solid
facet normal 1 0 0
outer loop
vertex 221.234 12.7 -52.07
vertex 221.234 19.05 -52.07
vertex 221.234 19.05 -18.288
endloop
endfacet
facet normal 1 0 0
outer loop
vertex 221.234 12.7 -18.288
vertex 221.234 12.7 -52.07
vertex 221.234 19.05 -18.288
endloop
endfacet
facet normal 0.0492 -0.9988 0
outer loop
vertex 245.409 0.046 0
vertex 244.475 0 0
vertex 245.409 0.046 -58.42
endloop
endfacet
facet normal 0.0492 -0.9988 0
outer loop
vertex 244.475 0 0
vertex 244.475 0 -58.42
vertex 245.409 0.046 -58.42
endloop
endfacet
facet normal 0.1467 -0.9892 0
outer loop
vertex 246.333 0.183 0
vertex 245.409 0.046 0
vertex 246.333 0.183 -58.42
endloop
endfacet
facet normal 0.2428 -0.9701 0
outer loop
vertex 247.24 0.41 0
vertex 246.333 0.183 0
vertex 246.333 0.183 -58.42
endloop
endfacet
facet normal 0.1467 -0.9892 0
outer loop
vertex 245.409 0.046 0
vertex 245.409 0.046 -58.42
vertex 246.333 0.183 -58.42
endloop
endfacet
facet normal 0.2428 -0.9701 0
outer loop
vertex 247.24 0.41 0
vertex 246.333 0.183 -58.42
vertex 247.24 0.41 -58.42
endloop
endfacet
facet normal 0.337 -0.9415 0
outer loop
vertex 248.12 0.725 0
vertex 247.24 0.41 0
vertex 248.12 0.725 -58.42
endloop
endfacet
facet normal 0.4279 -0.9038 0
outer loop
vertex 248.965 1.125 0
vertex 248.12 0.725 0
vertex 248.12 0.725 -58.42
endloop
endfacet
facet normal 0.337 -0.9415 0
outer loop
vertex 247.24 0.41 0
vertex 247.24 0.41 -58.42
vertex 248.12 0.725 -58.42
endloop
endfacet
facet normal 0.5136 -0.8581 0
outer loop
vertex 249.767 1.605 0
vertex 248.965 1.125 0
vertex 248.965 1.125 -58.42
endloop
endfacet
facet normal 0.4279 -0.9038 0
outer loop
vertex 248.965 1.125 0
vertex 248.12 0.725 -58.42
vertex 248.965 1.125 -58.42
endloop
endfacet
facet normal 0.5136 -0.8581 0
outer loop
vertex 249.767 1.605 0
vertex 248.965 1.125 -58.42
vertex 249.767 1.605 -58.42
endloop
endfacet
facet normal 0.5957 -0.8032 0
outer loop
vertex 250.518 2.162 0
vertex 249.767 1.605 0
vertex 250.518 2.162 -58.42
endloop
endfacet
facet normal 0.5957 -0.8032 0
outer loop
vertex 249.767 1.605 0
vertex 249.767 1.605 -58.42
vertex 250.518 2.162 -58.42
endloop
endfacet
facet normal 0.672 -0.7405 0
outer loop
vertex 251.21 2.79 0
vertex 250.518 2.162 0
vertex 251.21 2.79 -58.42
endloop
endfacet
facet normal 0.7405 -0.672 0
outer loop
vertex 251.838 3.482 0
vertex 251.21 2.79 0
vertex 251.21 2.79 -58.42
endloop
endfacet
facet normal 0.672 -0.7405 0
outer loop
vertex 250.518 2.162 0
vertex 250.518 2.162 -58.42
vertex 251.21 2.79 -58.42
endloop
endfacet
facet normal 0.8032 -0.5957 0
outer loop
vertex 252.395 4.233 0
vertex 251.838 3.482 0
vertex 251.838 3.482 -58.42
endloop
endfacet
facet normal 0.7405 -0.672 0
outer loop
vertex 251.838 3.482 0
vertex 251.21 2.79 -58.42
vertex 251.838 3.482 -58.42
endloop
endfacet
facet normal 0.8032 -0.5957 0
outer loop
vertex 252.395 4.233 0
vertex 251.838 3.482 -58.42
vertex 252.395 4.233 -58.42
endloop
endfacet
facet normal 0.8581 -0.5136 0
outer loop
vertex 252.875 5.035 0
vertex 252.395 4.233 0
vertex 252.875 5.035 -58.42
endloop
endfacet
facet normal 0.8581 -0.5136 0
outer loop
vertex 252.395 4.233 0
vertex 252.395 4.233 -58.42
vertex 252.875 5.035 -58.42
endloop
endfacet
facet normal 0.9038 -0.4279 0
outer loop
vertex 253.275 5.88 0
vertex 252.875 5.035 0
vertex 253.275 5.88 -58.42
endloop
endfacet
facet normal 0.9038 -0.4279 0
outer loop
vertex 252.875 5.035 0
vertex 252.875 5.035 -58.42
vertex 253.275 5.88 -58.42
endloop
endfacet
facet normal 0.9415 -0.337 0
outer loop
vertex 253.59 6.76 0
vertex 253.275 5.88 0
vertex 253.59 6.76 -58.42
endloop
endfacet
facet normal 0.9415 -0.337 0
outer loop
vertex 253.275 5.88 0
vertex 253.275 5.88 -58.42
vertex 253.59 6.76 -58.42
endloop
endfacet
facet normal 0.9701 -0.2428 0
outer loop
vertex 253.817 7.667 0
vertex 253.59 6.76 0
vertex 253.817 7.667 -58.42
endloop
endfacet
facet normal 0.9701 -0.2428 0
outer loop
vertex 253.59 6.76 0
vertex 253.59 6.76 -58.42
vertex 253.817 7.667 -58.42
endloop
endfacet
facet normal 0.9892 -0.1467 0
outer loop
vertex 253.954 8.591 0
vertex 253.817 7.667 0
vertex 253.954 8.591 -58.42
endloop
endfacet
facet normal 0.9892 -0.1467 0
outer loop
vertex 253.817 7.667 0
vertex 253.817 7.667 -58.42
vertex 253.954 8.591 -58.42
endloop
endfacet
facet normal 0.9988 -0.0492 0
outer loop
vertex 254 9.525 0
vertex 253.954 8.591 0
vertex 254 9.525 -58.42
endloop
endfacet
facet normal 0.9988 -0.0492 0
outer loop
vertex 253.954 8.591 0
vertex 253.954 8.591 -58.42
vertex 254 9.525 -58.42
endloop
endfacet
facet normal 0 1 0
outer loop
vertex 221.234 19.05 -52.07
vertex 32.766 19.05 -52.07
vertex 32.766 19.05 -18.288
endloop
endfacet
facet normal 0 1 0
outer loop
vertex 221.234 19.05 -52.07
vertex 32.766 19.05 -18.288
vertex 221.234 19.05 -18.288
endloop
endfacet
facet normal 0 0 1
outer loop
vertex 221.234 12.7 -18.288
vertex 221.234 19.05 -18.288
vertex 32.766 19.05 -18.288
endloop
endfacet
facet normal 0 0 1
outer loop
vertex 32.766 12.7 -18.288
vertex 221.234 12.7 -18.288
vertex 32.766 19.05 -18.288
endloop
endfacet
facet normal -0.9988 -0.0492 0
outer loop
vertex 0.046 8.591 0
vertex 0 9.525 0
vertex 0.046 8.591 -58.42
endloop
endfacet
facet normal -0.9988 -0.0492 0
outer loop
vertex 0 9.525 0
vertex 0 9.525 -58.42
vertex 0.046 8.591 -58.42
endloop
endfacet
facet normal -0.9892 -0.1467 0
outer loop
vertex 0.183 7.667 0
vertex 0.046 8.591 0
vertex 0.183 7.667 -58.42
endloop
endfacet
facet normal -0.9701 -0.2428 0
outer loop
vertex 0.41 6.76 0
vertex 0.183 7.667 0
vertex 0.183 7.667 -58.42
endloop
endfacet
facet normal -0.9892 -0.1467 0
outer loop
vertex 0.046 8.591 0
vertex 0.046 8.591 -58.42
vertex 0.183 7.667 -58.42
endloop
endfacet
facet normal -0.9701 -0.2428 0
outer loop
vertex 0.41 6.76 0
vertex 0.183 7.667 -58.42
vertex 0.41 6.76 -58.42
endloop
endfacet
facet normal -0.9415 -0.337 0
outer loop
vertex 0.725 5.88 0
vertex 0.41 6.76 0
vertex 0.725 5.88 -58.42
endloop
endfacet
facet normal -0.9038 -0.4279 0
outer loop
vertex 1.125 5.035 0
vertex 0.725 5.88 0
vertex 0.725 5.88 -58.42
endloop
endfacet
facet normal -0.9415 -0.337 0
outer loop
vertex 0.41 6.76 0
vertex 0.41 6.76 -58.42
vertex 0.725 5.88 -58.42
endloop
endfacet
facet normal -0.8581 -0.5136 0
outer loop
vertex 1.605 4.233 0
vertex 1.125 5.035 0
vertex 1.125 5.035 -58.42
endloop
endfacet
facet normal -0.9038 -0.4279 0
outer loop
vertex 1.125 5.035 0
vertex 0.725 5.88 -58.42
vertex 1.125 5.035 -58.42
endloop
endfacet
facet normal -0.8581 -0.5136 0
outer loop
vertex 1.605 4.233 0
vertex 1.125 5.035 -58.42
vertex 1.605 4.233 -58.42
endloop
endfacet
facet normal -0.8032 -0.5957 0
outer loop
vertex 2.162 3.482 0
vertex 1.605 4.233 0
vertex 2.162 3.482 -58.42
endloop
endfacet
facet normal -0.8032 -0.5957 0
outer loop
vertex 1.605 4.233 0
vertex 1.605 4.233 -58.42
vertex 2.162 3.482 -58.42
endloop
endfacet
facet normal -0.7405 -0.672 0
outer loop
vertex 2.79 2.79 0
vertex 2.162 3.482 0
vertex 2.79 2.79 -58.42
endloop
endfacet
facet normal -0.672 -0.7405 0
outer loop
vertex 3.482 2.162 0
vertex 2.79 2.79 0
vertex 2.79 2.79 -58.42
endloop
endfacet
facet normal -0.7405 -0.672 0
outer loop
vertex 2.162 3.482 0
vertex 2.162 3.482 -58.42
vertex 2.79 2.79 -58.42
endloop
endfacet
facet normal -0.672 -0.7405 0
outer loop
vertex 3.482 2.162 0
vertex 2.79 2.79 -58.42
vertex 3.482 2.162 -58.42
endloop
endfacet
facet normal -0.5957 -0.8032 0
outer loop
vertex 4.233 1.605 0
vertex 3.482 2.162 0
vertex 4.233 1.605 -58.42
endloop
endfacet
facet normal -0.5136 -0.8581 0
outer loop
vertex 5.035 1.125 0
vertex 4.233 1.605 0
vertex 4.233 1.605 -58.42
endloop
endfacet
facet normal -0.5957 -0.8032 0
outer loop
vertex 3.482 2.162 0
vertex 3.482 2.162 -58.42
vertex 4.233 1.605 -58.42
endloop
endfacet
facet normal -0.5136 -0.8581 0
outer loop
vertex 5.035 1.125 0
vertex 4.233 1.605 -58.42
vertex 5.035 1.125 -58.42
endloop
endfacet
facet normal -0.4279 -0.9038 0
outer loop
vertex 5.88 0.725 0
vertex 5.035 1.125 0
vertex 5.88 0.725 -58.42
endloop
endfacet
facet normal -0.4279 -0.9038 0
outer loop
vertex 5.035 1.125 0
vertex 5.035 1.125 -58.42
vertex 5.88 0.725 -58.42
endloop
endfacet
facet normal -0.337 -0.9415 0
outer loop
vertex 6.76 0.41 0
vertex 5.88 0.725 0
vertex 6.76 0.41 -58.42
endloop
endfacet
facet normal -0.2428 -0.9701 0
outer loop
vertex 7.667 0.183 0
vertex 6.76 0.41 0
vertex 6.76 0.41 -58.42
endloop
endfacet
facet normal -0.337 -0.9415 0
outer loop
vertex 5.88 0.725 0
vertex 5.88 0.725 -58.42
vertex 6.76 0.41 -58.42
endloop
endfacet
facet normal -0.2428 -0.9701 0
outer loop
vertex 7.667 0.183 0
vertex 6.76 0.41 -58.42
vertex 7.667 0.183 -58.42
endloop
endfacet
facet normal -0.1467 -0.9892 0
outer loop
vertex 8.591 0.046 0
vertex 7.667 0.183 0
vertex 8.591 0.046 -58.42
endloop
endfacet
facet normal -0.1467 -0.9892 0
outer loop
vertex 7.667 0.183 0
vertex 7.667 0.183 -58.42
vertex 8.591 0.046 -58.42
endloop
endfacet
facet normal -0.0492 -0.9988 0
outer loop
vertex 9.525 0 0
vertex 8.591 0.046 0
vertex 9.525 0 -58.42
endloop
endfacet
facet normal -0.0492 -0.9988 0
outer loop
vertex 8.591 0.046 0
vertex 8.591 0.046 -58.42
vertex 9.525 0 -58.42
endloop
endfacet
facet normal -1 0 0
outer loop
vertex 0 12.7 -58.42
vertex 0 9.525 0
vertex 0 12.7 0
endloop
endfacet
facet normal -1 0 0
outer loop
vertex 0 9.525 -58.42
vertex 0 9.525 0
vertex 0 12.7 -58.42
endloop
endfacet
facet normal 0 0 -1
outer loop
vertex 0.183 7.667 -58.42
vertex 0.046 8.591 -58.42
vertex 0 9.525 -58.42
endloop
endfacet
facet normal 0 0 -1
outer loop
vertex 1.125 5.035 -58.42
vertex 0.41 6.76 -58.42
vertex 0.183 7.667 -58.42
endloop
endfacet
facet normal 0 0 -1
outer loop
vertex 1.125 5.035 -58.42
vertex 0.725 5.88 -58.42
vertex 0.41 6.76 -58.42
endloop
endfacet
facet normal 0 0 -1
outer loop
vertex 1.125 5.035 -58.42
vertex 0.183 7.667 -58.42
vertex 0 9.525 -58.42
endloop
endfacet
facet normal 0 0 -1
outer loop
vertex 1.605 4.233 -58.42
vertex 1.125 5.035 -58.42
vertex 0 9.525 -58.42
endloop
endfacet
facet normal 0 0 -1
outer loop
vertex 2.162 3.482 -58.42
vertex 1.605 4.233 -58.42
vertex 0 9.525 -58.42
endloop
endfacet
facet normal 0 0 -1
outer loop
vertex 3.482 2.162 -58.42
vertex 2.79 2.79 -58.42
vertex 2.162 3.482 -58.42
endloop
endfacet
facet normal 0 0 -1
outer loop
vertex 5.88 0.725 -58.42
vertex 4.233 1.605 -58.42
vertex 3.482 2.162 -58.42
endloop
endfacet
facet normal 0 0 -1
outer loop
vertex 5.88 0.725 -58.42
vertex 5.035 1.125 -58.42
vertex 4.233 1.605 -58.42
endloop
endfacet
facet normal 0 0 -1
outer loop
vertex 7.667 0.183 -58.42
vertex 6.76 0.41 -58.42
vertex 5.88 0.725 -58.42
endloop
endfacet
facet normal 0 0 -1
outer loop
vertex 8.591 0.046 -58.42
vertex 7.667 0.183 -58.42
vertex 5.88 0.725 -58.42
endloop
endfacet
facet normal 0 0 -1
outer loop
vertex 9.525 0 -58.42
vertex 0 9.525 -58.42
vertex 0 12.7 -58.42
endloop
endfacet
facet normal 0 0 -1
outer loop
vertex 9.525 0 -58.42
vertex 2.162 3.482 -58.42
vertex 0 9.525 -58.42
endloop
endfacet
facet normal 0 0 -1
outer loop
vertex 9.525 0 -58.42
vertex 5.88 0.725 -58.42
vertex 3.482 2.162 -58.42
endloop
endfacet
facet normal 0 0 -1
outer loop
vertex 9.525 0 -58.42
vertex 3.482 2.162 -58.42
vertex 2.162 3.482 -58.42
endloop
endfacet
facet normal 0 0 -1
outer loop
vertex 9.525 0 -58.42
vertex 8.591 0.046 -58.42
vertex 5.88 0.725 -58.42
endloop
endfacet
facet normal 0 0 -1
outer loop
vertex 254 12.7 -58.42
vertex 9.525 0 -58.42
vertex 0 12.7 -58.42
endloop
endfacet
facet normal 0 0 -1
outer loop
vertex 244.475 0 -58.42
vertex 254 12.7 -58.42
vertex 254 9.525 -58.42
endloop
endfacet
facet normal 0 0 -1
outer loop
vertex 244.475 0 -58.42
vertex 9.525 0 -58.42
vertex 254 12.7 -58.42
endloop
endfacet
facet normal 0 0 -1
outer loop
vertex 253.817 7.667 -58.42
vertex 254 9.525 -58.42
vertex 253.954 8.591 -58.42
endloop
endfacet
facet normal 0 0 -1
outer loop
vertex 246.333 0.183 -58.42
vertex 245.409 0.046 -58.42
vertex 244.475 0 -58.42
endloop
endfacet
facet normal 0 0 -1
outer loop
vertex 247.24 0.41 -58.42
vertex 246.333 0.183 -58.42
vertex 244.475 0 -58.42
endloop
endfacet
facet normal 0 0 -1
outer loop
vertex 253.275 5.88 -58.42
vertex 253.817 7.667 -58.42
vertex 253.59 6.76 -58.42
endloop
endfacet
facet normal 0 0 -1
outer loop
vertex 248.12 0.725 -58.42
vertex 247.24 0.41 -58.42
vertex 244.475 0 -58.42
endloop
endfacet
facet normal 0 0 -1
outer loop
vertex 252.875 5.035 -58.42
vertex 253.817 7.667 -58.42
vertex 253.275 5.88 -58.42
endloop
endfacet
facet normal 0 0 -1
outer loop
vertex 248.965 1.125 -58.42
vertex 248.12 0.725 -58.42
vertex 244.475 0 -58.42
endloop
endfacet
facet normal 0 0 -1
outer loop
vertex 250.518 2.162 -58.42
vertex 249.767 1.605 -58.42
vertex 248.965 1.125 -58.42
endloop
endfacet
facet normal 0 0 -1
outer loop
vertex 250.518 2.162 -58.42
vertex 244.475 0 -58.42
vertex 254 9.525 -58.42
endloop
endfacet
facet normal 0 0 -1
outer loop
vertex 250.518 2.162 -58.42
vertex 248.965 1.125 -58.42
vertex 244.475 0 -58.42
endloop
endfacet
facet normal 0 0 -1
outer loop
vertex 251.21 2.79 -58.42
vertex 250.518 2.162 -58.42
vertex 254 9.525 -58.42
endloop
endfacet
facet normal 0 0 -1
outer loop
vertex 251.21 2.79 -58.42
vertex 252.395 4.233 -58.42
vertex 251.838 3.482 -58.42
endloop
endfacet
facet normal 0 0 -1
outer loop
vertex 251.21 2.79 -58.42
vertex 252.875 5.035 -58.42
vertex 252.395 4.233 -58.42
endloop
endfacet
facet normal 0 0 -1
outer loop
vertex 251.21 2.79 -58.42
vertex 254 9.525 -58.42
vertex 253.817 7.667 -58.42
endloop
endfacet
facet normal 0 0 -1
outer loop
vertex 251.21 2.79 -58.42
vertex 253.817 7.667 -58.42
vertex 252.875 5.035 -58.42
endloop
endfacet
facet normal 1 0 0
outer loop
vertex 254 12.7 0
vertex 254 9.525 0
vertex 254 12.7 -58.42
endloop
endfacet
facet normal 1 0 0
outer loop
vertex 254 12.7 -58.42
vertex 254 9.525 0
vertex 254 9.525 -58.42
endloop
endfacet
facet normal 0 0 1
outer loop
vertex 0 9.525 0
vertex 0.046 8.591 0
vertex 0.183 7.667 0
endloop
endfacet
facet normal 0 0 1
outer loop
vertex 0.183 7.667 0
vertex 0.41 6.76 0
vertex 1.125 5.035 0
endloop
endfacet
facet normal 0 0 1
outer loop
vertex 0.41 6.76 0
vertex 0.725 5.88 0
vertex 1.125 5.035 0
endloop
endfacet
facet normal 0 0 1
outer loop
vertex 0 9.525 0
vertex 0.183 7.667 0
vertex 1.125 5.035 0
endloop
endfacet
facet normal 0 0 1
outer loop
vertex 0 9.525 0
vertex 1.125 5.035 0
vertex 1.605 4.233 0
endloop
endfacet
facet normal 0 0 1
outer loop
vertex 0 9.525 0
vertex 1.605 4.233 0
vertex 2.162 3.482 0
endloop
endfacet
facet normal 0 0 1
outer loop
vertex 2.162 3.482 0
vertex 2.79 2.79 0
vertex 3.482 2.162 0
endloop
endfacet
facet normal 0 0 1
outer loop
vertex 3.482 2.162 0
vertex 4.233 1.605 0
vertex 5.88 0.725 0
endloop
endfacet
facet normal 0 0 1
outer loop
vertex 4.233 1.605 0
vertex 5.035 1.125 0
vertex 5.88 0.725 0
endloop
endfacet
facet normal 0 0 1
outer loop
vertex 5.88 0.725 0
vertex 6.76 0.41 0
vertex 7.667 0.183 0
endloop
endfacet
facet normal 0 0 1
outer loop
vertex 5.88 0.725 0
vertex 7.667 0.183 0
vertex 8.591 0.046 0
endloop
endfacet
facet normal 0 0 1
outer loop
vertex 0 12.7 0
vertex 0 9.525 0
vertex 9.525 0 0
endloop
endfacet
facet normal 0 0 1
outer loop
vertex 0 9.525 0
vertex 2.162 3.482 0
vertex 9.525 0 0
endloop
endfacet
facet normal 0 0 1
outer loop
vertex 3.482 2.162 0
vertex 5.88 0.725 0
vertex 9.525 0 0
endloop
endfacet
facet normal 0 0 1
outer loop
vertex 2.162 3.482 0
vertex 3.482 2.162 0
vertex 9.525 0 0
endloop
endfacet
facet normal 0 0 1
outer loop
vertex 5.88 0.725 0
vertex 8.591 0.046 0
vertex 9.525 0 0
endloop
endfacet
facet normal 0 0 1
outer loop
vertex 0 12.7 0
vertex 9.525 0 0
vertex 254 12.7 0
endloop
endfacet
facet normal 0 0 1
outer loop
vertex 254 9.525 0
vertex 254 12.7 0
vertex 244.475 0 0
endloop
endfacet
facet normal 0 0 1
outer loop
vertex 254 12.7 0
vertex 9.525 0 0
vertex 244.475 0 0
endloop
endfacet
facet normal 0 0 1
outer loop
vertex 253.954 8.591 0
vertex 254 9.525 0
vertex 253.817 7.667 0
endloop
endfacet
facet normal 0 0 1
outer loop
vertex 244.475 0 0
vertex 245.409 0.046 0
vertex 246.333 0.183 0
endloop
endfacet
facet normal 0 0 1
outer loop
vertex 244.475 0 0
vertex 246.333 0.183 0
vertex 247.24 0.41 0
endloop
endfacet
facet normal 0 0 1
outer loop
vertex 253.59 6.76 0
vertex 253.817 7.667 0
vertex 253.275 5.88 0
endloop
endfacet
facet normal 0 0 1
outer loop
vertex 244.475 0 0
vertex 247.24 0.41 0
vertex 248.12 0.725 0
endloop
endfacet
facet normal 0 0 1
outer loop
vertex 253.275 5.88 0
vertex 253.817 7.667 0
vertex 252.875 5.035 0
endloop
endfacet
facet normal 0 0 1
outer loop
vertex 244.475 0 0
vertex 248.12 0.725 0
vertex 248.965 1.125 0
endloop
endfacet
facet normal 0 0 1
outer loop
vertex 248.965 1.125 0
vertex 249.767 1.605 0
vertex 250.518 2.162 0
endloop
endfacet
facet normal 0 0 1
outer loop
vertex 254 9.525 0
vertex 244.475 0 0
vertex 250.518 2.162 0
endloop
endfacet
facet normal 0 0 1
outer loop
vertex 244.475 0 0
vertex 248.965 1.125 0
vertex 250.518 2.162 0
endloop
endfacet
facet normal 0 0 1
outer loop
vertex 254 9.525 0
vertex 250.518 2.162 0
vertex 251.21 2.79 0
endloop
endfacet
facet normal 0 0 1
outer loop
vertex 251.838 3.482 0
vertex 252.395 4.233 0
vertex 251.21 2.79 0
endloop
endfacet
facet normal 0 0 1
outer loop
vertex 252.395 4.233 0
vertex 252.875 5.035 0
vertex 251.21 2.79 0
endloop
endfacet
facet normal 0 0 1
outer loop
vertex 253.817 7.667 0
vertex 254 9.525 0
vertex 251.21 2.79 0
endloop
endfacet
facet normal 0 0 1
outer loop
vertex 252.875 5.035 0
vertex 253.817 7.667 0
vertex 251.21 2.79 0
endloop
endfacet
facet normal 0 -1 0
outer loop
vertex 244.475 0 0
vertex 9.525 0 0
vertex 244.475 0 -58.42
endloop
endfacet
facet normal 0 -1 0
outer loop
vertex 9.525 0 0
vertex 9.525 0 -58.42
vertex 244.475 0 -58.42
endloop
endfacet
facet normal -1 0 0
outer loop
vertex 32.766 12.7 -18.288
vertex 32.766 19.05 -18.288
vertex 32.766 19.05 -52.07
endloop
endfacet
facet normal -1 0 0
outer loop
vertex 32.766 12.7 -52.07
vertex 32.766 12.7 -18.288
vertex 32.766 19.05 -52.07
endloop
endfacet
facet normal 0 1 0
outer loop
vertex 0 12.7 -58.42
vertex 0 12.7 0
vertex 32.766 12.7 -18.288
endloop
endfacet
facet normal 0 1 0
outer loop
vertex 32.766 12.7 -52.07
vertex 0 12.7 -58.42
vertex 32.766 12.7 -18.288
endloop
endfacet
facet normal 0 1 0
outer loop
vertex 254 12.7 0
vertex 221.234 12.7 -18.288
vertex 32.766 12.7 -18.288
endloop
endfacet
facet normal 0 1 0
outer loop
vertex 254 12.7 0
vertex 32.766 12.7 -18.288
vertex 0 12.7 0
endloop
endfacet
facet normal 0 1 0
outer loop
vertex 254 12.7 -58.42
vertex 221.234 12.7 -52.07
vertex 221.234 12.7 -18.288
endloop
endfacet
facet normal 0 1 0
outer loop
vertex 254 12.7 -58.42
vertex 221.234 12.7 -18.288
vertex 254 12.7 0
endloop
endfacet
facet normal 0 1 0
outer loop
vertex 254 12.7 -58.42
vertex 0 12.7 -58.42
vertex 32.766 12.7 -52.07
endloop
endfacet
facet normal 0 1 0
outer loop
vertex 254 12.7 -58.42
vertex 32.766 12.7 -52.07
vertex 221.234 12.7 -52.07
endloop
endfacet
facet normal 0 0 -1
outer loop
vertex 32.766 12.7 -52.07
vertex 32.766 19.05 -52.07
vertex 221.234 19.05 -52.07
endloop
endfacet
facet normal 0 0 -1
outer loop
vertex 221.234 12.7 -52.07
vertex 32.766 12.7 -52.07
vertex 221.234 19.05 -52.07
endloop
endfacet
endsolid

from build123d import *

# Parameters (mm, degrees)
SKETCH1_W           = 254
SKETCH1_H           = 58.42
BOSS_EXTRUDE1_DEPTH = 19.05
CUT_EXTRUDE1_DEPTH  = 6.35
FILLET1_R           = 9.525


with BuildPart() as part:
    # Sketch1 → Boss-Extrude1 (new body)
    with BuildSketch(Plane(origin=(0, 0, 0), x_dir=(1, 0, 0), z_dir=(0, 1, 0))):
        with Locations((127, 29.21)):
            Rectangle(SKETCH1_W, SKETCH1_H)
    extrude(amount=BOSS_EXTRUDE1_DEPTH)

    # Sketch2 → Cut-Extrude1 (cut)
    with BuildSketch(Plane(origin=(0, 19.05, 0), x_dir=(1, 0, 0), z_dir=(0, 1, 0))):
        Polygon((221.234, 52.07), (221.234, 18.288), (127, 18.288), (127, 0), (254, 0), (254, 58.42), (127, 58.42), (127, 52.07), align=None)
        Polygon((127, 0), (127, 18.288), (32.766, 18.288), (32.766, 52.07), (127, 52.07), (127, 58.42), (0, 58.42), (0, 0), align=None)
    extrude(amount=-CUT_EXTRUDE1_DEPTH, mode=Mode.SUBTRACT)

    # Fillet1
    fillet1_edges = [part.edges().sort_by_distance(p)[0] for p in [
        (254, 0, -29.21),
        (0, 0, -29.21),
    ]]
    fillet(fillet1_edges, radius=FILLET1_R)


solid = part.part
